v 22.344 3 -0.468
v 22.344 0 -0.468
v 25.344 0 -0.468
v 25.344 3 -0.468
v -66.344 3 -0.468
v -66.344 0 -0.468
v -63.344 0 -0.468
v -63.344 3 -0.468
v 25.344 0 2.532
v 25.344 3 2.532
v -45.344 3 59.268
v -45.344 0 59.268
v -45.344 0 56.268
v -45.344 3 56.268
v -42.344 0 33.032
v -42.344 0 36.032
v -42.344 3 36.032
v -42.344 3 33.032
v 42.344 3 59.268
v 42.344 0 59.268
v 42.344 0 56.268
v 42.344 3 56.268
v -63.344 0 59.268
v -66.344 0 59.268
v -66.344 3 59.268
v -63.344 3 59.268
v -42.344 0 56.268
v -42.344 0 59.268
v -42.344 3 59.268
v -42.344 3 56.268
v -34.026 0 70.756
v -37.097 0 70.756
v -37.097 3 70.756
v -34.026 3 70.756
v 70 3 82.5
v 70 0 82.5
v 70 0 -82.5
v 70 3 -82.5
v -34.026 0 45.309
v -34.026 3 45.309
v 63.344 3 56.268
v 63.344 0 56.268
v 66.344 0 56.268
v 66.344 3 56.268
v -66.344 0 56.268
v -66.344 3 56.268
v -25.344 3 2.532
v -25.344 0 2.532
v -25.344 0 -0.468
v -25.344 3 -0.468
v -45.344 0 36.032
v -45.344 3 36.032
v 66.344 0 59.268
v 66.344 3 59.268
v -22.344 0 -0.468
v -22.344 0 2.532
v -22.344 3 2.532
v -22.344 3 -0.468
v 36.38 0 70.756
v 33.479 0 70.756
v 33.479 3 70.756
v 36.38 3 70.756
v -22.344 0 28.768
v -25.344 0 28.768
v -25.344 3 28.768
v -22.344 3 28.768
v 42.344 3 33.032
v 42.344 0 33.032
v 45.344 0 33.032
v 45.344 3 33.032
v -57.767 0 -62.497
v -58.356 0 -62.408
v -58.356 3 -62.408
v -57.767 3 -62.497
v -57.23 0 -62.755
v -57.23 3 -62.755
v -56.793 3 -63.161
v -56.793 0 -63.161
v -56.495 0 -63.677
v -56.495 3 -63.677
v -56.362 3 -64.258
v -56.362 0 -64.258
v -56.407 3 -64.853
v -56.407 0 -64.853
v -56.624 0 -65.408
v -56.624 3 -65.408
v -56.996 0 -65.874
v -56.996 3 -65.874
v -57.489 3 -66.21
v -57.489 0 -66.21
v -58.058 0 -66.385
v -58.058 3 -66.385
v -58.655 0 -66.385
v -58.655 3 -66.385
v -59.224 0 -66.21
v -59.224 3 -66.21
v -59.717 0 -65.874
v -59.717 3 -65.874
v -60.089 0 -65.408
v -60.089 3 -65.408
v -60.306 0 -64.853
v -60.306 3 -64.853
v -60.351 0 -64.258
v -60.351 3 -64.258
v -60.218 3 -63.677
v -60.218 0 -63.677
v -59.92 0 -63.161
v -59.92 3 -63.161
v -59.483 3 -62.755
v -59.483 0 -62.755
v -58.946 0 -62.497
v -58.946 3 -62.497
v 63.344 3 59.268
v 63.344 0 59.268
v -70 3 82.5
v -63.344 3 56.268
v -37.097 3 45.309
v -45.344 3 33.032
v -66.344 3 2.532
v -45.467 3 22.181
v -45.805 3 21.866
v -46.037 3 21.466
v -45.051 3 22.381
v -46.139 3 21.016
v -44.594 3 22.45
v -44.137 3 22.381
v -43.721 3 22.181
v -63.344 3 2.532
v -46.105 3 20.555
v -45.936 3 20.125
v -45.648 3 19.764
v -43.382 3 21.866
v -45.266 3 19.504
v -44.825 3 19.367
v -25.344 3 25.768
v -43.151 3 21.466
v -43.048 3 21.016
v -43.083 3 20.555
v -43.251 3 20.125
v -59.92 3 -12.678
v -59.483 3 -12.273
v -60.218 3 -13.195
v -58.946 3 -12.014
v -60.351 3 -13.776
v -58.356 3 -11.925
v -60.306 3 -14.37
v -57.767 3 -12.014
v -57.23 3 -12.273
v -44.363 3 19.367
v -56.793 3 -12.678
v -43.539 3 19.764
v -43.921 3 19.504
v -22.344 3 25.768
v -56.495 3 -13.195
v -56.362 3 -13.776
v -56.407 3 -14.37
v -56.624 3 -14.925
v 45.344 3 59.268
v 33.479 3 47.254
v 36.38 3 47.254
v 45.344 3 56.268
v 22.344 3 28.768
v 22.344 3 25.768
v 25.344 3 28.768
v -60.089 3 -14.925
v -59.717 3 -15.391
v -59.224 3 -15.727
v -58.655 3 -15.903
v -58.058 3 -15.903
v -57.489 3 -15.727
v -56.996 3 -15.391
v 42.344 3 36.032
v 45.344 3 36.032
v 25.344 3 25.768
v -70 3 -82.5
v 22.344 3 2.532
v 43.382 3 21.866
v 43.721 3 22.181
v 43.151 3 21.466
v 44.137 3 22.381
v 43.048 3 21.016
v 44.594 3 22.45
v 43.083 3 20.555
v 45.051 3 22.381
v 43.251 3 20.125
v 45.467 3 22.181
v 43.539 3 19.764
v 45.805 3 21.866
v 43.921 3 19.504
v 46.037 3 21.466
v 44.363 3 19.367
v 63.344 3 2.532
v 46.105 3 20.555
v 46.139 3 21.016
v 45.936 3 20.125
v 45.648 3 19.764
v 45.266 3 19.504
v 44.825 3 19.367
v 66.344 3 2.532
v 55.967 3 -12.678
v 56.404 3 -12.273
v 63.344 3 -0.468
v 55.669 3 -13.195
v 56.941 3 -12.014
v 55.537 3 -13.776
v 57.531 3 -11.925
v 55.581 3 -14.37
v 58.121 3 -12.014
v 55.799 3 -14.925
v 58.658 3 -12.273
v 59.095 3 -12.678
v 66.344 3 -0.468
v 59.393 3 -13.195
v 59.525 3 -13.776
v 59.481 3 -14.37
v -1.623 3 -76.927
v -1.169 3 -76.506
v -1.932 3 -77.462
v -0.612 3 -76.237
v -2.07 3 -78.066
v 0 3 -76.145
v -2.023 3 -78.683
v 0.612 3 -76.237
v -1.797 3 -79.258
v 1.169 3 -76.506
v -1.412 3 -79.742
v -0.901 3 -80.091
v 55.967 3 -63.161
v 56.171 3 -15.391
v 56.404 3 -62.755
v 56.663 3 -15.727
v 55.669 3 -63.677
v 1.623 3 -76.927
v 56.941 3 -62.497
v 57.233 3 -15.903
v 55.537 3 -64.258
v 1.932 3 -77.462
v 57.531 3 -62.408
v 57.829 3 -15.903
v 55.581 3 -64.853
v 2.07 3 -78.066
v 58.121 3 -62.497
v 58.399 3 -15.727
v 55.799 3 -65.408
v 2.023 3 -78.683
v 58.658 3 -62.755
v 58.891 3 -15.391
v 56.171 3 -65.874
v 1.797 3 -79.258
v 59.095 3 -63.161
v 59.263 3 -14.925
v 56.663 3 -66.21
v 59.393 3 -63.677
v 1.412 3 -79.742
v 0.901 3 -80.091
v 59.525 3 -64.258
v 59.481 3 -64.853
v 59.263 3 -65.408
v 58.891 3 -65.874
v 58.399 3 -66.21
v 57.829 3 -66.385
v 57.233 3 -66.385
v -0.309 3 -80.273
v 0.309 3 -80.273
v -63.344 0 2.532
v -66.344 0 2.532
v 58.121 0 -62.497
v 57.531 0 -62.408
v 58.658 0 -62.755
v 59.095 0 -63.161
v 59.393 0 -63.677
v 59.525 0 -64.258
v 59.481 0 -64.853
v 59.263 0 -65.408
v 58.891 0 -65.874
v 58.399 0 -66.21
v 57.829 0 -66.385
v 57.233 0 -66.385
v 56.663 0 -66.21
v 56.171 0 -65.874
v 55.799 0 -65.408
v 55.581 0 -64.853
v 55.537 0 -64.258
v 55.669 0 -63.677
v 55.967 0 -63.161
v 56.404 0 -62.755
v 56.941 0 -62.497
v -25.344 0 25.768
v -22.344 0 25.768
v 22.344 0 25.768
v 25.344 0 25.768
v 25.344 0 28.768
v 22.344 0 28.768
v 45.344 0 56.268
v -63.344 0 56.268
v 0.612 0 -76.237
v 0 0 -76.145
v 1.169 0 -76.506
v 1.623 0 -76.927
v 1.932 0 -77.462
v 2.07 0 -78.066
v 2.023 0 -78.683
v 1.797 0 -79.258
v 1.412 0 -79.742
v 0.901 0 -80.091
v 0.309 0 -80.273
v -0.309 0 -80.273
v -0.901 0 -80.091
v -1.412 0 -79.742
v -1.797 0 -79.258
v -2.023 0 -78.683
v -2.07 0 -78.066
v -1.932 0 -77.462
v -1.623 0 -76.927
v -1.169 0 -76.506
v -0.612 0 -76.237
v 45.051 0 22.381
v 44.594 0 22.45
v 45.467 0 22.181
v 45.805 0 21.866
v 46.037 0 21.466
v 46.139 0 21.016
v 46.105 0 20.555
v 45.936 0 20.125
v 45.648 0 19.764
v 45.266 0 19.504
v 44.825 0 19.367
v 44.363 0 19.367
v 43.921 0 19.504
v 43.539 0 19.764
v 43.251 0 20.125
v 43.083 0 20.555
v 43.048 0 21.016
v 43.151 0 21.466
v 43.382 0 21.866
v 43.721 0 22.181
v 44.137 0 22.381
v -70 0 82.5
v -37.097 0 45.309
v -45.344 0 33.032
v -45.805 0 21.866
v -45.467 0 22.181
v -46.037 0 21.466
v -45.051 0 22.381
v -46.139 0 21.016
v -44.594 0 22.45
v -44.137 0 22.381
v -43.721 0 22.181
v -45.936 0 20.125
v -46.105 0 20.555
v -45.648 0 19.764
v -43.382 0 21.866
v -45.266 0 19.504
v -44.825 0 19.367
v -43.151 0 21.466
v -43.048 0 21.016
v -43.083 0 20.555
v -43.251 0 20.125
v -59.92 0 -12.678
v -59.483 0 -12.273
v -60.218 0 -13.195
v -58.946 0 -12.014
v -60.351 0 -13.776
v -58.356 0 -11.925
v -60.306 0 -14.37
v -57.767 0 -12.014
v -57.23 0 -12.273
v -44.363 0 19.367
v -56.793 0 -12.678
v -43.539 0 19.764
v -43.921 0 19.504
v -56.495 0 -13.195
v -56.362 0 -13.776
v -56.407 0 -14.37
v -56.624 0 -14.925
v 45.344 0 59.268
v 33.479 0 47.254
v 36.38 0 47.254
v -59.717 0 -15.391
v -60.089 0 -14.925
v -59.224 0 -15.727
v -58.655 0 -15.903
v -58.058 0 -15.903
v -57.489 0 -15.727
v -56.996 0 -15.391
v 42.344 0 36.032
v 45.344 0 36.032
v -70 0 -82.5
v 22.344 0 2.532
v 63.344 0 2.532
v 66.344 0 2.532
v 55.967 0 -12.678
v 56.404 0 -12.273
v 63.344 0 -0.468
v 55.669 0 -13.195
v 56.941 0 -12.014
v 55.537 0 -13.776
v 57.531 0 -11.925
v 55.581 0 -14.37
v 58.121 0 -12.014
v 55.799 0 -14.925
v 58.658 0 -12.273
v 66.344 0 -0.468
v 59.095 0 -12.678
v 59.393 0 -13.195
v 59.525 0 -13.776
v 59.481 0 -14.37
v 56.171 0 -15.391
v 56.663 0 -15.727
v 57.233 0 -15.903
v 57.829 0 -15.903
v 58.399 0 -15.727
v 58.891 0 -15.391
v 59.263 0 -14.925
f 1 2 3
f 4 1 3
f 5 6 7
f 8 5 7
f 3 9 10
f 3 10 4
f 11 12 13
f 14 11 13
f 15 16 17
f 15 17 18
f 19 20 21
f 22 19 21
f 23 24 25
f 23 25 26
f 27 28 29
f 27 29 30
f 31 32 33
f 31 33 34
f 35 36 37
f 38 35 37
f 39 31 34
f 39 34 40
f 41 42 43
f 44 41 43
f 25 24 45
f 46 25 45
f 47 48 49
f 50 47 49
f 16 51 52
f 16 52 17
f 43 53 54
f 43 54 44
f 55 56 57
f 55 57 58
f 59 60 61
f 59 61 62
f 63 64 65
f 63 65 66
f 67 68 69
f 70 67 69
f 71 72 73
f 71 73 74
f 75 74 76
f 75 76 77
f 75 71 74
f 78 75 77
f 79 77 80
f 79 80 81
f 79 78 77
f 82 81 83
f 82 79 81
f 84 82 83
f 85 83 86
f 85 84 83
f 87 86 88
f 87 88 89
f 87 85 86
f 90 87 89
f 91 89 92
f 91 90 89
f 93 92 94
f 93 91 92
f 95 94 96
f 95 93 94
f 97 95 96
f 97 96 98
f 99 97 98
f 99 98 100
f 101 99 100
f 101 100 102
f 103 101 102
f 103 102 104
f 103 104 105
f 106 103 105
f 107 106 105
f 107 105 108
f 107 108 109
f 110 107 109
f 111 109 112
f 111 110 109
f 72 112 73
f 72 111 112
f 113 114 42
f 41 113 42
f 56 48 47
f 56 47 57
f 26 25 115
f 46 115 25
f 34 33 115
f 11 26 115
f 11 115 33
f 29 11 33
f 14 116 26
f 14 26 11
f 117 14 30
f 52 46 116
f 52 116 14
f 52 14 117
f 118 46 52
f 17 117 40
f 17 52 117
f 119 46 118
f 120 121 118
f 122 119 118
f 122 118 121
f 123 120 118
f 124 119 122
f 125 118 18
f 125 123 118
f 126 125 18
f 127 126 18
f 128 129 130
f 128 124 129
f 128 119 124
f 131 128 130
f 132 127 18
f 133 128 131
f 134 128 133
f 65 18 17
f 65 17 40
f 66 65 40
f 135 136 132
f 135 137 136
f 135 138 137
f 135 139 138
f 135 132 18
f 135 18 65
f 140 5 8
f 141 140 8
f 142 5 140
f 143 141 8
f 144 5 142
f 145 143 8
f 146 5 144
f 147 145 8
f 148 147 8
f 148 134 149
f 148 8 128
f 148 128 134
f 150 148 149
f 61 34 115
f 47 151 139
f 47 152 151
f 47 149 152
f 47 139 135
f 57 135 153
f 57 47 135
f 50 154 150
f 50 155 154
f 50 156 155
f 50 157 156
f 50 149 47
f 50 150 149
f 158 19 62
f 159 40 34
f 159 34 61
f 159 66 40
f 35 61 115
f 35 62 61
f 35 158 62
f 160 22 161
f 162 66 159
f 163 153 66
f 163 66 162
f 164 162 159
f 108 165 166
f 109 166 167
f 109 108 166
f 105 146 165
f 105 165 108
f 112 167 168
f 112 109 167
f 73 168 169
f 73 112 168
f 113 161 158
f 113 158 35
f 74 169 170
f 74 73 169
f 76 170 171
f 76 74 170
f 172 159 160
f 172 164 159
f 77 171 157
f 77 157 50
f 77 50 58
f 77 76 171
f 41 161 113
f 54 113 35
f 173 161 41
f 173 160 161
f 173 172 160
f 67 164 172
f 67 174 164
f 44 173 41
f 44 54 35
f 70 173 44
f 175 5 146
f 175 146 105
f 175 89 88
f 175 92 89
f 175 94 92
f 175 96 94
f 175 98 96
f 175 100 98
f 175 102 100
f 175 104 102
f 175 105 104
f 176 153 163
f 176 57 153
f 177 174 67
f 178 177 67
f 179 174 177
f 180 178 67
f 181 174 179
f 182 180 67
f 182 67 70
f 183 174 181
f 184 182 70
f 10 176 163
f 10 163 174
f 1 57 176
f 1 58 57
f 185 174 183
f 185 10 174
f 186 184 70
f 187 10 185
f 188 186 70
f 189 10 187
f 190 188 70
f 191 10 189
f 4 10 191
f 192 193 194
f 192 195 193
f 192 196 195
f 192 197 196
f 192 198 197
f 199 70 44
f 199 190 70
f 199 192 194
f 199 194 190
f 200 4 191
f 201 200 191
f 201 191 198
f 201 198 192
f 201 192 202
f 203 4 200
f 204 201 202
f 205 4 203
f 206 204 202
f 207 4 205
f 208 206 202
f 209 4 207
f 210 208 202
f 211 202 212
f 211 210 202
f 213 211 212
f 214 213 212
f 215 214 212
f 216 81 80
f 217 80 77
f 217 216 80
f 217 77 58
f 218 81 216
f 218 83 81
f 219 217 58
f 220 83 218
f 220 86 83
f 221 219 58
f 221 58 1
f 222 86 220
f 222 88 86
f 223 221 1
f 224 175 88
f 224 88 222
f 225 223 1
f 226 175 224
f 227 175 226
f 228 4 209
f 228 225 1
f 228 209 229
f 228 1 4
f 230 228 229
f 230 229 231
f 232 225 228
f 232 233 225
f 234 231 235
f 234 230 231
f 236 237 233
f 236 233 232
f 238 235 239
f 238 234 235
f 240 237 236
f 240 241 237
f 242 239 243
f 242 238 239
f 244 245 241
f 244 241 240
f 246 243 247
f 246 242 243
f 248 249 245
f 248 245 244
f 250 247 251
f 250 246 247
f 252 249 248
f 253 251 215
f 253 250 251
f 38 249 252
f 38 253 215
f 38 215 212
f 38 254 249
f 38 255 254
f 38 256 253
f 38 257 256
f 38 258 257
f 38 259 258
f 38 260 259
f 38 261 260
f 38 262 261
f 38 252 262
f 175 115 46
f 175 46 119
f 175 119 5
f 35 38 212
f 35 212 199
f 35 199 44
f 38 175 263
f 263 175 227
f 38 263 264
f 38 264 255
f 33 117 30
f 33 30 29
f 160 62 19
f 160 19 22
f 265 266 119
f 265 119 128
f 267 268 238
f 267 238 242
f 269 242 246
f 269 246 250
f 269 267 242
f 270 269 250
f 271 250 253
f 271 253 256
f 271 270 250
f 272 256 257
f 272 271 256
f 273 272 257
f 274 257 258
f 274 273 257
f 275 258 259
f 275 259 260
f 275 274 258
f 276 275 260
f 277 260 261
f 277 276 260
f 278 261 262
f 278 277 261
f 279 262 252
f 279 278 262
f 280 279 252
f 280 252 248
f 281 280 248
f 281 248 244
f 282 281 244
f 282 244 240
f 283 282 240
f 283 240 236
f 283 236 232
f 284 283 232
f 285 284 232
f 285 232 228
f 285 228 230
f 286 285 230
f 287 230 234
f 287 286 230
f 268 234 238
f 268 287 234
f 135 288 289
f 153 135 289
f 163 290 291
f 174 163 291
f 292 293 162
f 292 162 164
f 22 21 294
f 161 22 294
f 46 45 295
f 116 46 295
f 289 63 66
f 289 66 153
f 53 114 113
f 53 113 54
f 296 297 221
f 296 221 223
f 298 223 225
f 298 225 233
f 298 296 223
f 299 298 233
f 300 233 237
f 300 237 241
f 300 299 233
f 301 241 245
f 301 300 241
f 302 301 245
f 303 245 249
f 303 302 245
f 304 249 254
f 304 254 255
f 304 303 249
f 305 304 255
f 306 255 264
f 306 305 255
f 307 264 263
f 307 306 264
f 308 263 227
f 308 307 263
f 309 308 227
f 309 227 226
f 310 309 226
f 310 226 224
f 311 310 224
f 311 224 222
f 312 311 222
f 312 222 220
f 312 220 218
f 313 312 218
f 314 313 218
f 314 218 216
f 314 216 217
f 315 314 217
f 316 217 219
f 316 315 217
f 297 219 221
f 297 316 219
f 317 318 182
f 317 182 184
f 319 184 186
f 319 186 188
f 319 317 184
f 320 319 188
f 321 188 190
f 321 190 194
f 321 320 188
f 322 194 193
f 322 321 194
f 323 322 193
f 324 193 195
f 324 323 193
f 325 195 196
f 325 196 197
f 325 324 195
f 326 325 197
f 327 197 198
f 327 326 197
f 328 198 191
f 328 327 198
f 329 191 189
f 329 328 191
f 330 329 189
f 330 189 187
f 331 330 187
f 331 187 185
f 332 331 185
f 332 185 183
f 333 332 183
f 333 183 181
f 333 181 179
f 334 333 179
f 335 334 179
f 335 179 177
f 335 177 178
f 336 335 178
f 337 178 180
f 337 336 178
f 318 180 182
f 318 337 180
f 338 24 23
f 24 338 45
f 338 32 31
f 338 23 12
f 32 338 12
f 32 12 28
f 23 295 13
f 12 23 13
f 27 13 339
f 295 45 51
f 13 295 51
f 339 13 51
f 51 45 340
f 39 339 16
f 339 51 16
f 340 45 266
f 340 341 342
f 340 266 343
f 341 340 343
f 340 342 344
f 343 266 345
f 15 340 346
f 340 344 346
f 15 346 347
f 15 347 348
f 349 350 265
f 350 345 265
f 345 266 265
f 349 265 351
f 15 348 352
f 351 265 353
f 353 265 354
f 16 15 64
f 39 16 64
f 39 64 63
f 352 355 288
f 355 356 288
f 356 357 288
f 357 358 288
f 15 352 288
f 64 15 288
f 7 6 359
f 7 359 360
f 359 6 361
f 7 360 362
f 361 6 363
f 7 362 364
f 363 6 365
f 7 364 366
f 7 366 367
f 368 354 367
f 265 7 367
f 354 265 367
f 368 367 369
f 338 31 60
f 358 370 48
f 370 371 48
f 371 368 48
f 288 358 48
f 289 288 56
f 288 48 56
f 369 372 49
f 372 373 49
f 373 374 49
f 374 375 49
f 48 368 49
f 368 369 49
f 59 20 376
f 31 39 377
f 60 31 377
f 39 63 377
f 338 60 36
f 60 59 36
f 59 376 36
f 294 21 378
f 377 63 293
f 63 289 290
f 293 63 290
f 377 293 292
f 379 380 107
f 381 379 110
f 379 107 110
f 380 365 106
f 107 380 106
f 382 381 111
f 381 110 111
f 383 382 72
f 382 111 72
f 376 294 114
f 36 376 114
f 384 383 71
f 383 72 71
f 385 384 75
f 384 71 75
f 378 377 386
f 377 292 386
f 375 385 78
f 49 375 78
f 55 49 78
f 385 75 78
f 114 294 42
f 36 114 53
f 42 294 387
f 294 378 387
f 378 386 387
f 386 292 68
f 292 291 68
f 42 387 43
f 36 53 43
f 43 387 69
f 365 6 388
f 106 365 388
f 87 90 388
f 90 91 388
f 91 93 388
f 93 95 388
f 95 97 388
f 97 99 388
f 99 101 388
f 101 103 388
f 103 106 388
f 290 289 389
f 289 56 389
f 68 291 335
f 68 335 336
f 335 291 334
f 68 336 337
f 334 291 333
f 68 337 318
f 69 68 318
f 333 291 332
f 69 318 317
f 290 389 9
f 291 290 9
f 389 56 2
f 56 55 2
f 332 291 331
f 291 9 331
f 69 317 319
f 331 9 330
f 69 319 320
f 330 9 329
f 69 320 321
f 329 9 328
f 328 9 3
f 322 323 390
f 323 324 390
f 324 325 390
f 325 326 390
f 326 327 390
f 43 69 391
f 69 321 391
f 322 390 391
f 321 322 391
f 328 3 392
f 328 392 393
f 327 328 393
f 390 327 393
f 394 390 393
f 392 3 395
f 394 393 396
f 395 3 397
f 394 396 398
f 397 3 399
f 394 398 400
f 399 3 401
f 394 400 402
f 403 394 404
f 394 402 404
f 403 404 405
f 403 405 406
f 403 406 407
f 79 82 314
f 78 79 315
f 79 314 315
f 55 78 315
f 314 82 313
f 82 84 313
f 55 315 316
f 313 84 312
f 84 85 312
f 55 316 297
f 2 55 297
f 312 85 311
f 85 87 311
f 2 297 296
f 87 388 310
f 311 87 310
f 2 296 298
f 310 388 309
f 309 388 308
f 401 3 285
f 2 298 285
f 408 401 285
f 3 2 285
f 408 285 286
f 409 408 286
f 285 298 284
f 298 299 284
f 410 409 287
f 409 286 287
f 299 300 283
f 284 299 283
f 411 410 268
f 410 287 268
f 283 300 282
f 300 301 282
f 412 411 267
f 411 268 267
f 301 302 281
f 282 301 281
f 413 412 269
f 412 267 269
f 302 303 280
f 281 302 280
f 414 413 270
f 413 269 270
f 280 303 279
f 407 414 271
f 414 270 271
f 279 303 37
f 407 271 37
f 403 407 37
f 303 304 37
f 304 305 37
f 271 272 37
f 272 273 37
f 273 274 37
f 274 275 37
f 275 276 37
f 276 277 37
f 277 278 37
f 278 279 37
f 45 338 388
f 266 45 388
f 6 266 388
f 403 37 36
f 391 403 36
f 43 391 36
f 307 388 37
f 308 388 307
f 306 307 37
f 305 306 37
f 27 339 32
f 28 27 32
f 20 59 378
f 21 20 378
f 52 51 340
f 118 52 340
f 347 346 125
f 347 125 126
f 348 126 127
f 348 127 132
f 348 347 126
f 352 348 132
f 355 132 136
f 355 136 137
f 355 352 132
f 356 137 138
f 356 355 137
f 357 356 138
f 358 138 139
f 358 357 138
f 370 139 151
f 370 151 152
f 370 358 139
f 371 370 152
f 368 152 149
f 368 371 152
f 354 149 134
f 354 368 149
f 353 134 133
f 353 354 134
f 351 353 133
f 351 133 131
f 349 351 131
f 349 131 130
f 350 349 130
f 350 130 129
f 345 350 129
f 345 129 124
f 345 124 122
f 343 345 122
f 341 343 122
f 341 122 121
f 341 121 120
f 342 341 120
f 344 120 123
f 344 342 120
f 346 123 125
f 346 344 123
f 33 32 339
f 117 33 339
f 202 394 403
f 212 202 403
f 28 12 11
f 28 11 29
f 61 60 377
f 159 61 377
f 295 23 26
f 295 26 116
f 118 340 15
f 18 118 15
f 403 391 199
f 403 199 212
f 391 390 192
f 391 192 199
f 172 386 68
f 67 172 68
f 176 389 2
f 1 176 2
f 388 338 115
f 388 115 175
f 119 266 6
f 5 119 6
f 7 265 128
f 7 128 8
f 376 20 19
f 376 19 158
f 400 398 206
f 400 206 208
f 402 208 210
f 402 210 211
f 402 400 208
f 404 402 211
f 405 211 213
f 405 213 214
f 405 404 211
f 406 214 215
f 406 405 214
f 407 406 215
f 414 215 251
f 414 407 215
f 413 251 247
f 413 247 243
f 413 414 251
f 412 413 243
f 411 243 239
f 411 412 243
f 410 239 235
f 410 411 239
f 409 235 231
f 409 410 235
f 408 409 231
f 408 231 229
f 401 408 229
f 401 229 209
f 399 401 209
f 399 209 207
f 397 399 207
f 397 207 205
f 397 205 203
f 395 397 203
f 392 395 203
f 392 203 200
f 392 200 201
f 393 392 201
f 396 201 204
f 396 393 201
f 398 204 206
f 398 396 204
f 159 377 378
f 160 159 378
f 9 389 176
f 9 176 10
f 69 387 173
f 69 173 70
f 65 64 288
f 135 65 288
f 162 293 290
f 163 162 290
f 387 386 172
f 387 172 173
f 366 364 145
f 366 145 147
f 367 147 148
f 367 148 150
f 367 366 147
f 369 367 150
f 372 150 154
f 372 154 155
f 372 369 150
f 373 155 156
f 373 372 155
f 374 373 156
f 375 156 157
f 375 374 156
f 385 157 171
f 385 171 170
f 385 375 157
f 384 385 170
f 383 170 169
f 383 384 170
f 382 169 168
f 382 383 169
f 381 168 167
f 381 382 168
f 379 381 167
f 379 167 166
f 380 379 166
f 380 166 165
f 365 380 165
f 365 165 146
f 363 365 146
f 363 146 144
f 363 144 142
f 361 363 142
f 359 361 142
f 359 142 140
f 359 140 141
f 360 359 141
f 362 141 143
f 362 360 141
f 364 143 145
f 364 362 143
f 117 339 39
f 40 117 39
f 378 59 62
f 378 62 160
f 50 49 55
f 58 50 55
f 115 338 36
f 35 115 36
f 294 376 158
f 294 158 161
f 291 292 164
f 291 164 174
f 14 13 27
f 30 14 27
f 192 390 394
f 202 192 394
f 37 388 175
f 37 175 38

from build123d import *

# Parameters (mm, degrees)
SKETCH1_W           = 140
SKETCH1_H           = 165
SKETCH1_R           = 2.075495439
SKETCH1_R_2         = 1.55
SKETCH1_R_3         = 1.99999854
SKETCH1_W_2         = 3
SKETCH1_H_2         = 3
SKETCH1_W_3         = 3.071243945
SKETCH1_H_3         = 25.44744983
SKETCH1_W_4         = 2.90164108
SKETCH1_H_4         = 23.501913203
BOSS_EXTRUDE1_DEPTH = 3


with BuildPart() as part:
    # Sketch1 → Boss-Extrude1 (new body)
    with BuildSketch(Plane(origin=(0, 0, 0), x_dir=(1, 0, 0), z_dir=(0, 1, 0))):
        Rectangle(SKETCH1_W, SKETCH1_H)
        with Locations(Location((0, 78.220695367, 0), (0, 0, 270))):
            Circle(SKETCH1_R, mode=Mode.SUBTRACT)
        with Locations(Location((-44.593659723, -20.900034899, 0), (0, 0, 270))):
            Circle(SKETCH1_R_2, mode=Mode.SUBTRACT)
        with Locations(Location((44.593659723, -20.900034899, 0), (0, 0, 270))):
            Circle(SKETCH1_R_2, mode=Mode.SUBTRACT)
        with Locations(Location((-58.3565, 13.925245662, 0), (0, 0, 270))):
            Circle(SKETCH1_R_3, mode=Mode.SUBTRACT)
        with Locations(Location((-58.3565, 64.407745662, 0), (0, 0, 270))):
            Circle(SKETCH1_R_3, mode=Mode.SUBTRACT)
        with Locations(Location((57.531, 64.407745662, 0), (0, 0, 270))):
            Circle(SKETCH1_R_3, mode=Mode.SUBTRACT)
        with Locations(Location((57.531, 13.925245662, 0), (0, 0, 270))):
            Circle(SKETCH1_R_3, mode=Mode.SUBTRACT)
        with Locations((-23.843659723, -1.031919399)):
            Rectangle(SKETCH1_W_2, SKETCH1_H_2, mode=Mode.SUBTRACT)
        with Locations((-64.843659723, -1.031884133)):
            Rectangle(SKETCH1_W_2, SKETCH1_H_2, mode=Mode.SUBTRACT)
        with Locations((-64.843659723, -57.768115133)):
            Rectangle(SKETCH1_W_2, SKETCH1_H_2, mode=Mode.SUBTRACT)
        with Locations((-43.843659723, -57.768150399)):
            Rectangle(SKETCH1_W_2, SKETCH1_H_2, mode=Mode.SUBTRACT)
        with Locations((-43.843659723, -34.531919899)):
            Rectangle(SKETCH1_W_2, SKETCH1_H_2, mode=Mode.SUBTRACT)
        with Locations((-23.843659723, -27.268149899)):
            Rectangle(SKETCH1_W_2, SKETCH1_H_2, mode=Mode.SUBTRACT)
        with Locations((43.843659723, -34.531919899)):
            Rectangle(SKETCH1_W_2, SKETCH1_H_2, mode=Mode.SUBTRACT)
        with Locations((23.843659723, -27.268149899)):
            Rectangle(SKETCH1_W_2, SKETCH1_H_2, mode=Mode.SUBTRACT)
        with Locations((43.843659723, -57.768150399)):
            Rectangle(SKETCH1_W_2, SKETCH1_H_2, mode=Mode.SUBTRACT)
        with Locations((64.843659723, -57.768115133)):
            Rectangle(SKETCH1_W_2, SKETCH1_H_2, mode=Mode.SUBTRACT)
        with Locations((64.843659723, -1.031884133)):
            Rectangle(SKETCH1_W_2, SKETCH1_H_2, mode=Mode.SUBTRACT)
        with Locations((23.843659723, -1.031919399)):
            Rectangle(SKETCH1_W_2, SKETCH1_H_2, mode=Mode.SUBTRACT)
        with Locations((-35.561590823, -58.032613537)):
            Rectangle(SKETCH1_W_3, SKETCH1_H_3, mode=Mode.SUBTRACT)
        with Locations((34.92934681, -59.005381851)):
            Rectangle(SKETCH1_W_4, SKETCH1_H_4, mode=Mode.SUBTRACT)
    extrude(amount=BOSS_EXTRUDE1_DEPTH)


solid = part.part
